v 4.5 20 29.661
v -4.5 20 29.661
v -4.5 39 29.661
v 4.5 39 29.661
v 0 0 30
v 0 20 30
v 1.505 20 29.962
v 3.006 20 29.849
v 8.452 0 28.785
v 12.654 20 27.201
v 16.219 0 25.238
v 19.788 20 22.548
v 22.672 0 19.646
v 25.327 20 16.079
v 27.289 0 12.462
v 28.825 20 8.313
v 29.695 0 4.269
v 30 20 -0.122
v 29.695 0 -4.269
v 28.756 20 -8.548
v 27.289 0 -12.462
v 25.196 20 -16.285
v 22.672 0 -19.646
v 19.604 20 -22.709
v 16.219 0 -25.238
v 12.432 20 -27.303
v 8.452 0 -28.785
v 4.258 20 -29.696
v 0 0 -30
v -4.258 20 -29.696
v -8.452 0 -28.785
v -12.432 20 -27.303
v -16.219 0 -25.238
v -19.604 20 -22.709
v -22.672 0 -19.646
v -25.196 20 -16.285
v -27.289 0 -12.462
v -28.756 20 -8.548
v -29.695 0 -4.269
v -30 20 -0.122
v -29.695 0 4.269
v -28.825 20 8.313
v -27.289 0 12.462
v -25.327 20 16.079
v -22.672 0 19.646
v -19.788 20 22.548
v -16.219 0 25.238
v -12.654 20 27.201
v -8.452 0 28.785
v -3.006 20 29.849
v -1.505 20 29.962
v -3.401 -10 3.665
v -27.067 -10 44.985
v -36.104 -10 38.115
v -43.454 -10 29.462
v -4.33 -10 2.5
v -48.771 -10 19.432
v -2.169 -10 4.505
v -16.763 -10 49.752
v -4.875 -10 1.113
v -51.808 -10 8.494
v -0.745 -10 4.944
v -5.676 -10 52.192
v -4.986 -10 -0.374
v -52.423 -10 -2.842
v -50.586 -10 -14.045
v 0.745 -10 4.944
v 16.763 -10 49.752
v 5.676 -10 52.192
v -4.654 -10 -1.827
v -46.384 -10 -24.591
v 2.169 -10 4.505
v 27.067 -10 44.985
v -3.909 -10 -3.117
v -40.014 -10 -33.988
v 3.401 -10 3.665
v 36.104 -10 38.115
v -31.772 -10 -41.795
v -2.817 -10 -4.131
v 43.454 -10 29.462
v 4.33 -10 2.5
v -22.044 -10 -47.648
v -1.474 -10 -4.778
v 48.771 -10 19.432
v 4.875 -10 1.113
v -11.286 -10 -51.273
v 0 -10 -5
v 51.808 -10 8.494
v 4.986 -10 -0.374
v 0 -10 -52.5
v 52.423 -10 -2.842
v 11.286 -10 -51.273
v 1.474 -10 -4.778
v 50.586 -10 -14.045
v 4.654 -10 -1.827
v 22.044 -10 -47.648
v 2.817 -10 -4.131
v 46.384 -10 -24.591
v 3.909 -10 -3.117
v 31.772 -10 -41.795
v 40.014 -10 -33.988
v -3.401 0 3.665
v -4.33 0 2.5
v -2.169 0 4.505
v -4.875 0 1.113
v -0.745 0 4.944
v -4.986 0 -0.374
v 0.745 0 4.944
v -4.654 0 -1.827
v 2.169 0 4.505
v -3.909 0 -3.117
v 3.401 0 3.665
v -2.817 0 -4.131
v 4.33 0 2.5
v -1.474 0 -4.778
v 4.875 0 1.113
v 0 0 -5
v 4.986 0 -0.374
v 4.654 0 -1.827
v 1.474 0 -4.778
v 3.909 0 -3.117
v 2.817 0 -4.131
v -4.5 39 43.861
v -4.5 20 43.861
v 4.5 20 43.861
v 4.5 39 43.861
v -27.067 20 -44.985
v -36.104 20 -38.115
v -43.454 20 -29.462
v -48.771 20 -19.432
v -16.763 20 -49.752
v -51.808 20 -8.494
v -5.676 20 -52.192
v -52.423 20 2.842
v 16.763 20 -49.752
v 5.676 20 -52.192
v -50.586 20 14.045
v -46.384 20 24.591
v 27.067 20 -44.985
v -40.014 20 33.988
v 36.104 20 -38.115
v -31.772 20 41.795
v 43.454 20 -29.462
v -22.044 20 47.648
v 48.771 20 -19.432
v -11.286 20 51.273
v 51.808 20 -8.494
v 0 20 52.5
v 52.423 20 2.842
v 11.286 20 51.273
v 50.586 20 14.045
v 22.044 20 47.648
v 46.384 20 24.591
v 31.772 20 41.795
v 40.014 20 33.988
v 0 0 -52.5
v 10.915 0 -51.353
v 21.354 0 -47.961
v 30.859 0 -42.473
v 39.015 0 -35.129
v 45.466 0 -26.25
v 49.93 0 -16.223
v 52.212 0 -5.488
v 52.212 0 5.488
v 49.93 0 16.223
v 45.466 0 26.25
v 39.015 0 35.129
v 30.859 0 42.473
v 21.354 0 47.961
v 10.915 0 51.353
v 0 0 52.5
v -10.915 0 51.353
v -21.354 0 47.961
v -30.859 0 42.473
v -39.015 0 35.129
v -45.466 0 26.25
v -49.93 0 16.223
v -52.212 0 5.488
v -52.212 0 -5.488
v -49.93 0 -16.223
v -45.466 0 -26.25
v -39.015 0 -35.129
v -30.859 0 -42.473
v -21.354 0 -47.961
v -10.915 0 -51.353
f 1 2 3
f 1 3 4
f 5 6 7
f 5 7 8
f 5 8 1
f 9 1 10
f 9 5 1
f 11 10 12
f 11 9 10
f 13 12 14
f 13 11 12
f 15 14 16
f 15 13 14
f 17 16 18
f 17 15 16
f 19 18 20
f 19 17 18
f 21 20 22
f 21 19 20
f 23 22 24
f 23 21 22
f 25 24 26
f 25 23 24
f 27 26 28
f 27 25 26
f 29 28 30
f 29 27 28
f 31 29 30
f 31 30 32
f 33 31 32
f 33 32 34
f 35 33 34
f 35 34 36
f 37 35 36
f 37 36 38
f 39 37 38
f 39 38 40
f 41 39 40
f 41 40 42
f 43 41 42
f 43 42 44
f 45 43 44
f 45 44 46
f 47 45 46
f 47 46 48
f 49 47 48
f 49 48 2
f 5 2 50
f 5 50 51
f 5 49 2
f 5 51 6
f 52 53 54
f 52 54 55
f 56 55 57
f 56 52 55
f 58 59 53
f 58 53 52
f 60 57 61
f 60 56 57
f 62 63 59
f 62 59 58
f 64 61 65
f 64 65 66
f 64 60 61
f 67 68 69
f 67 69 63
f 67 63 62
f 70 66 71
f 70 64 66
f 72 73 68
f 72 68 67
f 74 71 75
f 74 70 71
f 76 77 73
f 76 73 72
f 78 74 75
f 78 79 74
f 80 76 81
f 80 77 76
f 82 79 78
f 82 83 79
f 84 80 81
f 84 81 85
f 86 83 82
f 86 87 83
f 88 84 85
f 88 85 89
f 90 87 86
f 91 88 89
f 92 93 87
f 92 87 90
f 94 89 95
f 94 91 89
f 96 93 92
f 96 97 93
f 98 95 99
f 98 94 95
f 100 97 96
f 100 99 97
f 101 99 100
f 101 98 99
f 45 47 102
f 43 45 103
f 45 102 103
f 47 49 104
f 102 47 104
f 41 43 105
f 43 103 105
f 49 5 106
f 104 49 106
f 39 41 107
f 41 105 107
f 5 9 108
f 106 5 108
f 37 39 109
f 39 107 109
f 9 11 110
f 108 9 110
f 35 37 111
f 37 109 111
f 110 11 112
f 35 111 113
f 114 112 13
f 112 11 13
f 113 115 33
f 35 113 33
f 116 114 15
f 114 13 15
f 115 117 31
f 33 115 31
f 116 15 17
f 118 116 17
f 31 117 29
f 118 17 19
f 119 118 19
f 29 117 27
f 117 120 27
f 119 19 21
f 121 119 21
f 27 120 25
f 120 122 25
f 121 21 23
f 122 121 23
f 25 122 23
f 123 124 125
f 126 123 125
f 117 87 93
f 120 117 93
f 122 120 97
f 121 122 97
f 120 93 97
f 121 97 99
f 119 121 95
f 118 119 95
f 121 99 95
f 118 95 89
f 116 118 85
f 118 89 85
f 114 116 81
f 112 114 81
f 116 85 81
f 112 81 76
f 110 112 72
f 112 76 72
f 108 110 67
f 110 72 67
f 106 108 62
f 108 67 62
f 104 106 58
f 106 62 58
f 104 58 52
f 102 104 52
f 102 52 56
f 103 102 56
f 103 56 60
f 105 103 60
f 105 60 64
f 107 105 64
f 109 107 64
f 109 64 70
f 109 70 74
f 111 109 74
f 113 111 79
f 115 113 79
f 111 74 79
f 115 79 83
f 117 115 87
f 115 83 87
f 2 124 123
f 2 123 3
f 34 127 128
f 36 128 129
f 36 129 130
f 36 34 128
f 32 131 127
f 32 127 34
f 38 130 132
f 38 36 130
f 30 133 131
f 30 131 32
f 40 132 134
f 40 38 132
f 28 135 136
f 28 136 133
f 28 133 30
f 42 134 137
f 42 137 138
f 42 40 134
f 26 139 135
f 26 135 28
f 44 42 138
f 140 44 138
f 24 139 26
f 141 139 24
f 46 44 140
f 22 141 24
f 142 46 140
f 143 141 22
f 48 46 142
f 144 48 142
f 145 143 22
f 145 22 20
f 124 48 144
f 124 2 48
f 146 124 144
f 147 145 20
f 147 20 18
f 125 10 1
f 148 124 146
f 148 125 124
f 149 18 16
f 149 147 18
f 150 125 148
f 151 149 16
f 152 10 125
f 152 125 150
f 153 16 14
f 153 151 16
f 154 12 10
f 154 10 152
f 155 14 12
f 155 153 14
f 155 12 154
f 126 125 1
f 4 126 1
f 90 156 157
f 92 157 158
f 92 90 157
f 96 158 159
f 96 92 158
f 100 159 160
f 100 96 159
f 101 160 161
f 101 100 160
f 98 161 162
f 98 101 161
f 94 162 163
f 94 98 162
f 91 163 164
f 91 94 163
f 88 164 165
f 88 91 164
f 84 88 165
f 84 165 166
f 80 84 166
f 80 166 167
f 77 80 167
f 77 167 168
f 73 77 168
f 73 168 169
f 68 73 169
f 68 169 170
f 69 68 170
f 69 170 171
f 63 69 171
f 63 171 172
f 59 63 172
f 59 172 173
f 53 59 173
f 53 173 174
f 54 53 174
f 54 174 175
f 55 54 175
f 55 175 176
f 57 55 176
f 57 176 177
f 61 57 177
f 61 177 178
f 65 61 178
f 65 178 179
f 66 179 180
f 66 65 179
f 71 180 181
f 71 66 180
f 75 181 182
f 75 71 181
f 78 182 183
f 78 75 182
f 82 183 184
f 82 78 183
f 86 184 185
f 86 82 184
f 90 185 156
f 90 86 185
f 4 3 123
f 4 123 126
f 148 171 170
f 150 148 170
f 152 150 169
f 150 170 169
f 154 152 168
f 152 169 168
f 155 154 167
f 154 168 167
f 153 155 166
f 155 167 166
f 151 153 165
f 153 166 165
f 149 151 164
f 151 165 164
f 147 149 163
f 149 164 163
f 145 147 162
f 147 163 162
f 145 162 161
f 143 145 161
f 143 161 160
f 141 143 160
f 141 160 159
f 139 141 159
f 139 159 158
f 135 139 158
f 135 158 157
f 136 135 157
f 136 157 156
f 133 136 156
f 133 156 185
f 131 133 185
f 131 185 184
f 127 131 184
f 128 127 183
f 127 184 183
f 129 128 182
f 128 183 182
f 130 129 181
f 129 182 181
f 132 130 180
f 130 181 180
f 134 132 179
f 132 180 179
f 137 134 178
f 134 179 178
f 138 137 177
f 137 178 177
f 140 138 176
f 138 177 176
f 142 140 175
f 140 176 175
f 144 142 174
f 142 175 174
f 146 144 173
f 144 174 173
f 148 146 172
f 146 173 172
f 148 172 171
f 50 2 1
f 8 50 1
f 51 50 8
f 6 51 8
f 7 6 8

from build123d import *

# Parameters (mm, degrees)
SKIZZE1_R                       = 52.5
SKIZZE1_R_2                     = 30
AUFSATZ_LINEAR_AUSTRAGEN1_DEPTH = 20
AUFSATZ_LINEAR_START            = 10
SKIZZE2_R                       = 52.5
SKIZZE2_R_2                     = 5
AUFSATZ_LINEAR_AUSTRAGEN2_DEPTH = 10
SKIZZE3_W                       = 9
SKIZZE3_H                       = 14.2
AUFSATZ_LINEAR_AUSTRAGEN3_DEPTH = 19


with BuildPart() as part:
    # Skizze1 → Aufsatz-Linear austragen1 (new body)
    with BuildSketch(Plane(origin=(0, 0, 0), x_dir=(1, 0, 0), z_dir=(0, 1, 0))):
        with Locations(Location((0, 0, 0), (0, 0, 270))):
            Circle(SKIZZE1_R)
        with Locations(Location((0, 0, 0), (0, 0, 270))):
            Circle(SKIZZE1_R_2, mode=Mode.SUBTRACT)
    extrude(amount=AUFSATZ_LINEAR_AUSTRAGEN1_DEPTH)

    # Skizze2 → Aufsatz-Linear austragen2 (add)
    with BuildSketch(Plane.XZ.offset(AUFSATZ_LINEAR_START)):
        with Locations(Location((0, 0, 0), (0, 0, 270))):
            Circle(SKIZZE2_R)
        with Locations(Location((0, 0, 0), (0, 0, 270))):
            Circle(SKIZZE2_R_2, mode=Mode.SUBTRACT)
    extrude(amount=-AUFSATZ_LINEAR_AUSTRAGEN2_DEPTH)

    # Skizze3 → Aufsatz-Linear austragen3 (add)
    with BuildSketch(Plane(origin=(0, 20, 0), x_dir=(1, 0, 0), z_dir=(0, 1, 0))):
        with Locations((0, -36.7605799)):
            Rectangle(SKIZZE3_W, SKIZZE3_H)
    extrude(amount=AUFSATZ_LINEAR_AUSTRAGEN3_DEPTH)


solid = part.part
